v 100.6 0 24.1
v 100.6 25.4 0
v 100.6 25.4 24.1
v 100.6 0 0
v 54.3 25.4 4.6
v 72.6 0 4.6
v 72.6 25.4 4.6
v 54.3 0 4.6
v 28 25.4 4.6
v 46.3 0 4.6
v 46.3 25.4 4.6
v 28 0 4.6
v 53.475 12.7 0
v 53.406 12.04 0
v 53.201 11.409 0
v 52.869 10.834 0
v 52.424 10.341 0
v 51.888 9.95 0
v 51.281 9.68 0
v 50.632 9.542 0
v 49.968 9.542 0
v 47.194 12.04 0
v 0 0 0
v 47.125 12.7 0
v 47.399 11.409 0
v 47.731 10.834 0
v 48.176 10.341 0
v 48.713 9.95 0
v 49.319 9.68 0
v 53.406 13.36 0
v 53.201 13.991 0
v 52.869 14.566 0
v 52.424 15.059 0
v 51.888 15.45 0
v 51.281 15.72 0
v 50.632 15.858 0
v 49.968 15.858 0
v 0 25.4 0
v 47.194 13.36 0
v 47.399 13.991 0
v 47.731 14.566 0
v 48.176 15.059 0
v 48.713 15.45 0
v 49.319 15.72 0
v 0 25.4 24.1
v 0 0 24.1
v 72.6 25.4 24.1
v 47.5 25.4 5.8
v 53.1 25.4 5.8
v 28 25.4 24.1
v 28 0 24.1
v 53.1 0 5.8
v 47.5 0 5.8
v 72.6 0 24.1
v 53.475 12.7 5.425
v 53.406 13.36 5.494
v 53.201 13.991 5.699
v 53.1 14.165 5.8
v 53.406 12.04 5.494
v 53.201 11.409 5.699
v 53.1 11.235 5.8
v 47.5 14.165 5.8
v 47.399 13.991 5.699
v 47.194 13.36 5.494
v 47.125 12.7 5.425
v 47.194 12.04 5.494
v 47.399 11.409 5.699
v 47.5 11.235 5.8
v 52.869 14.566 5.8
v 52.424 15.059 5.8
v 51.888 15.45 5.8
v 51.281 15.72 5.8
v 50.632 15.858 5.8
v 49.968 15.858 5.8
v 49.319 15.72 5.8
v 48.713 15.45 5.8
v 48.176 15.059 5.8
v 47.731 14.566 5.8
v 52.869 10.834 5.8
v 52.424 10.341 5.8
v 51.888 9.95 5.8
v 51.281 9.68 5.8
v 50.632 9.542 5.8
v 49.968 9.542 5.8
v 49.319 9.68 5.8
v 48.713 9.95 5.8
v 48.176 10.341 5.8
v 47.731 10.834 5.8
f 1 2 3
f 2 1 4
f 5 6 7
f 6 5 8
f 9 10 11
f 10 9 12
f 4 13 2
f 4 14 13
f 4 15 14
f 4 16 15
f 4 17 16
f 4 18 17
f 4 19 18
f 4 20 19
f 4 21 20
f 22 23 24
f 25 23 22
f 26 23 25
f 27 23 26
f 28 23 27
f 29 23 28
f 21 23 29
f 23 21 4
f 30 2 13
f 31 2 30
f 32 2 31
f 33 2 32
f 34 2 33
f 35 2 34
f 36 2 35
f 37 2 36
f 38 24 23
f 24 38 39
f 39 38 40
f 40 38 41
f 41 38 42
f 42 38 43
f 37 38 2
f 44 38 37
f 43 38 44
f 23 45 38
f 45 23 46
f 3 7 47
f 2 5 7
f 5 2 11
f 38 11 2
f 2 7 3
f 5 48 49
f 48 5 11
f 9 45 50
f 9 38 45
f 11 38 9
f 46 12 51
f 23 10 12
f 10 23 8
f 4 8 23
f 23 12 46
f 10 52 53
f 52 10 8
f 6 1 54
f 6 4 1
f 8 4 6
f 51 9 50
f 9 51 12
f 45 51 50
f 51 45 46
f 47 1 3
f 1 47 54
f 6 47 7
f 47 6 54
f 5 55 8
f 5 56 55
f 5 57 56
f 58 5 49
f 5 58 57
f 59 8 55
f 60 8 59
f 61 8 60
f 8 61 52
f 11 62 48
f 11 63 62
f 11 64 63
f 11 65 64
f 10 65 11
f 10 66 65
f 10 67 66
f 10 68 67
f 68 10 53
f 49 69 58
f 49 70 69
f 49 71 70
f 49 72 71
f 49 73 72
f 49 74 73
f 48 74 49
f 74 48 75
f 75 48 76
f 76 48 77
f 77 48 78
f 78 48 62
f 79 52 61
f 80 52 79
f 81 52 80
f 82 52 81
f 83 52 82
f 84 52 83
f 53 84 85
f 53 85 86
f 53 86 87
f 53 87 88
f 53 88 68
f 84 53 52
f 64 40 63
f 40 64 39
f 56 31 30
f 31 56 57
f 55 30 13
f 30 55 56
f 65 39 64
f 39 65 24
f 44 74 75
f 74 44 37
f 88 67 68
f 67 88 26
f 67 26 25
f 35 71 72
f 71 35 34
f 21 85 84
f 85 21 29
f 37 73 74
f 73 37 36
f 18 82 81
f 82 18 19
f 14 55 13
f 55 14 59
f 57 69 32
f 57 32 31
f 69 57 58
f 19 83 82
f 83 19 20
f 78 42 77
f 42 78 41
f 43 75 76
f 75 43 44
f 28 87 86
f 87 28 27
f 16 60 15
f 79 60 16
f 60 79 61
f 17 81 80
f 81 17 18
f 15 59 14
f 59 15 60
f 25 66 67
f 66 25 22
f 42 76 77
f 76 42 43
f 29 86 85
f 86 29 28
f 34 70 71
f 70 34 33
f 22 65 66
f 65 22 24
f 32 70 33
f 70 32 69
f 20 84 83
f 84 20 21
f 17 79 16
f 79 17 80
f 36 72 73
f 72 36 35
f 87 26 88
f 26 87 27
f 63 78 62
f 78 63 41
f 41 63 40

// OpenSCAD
// End stop for Woodpeckers Story Stick

i2mm = 25.4; // inch to mm conversion
block_x = 28.0;
block_y = 1.0 * i2mm;
block_z = 19.5;

gap_x = 44.6;

wedge_x = 8;
wedge_z = 1.2;
wedge_y = block_y;

plate_x = 2 * block_x + gap_x;
plate_y = block_y;
plate_z = 4.6;

center_x = plate_x/2.0;
center_y = plate_y/2.0;

hole_dia = 1/4.0 * i2mm;
$fs = 0.1;

// The rectangular prism block on each end
module stop_block() {
    cube([block_x, block_y, block_z]);
}

// The flat plate on top
module top_plate() {
    cube([plate_x, plate_y, plate_z]);
}


module wedge_trapezoid_2D() {
    top_x = wedge_x - 2.0 * wedge_z; // 45 degree angle
    dx = wedge_z;
    polygon([[0.0, 0.0],
            [dx, wedge_z], [dx + top_x, wedge_z],
            [wedge_x, 0.0]]);
}

// The trapezoid tab in the center, below the top plate
module wedge() {
    translate([0, wedge_y, 0])
        rotate([90, 0, 0])
            linear_extrude(height = wedge_y)
                wedge_trapezoid_2D();
}

module stop() {
    top_plate();
    translate([0, 0, plate_z]) stop_block();
    translate([block_x + gap_x, 0, plate_z]) stop_block();
    translate([center_x - wedge_x/2.0, 0, plate_z])
        wedge();
}

module hole() {
    cylinder(h = plate_z + wedge_z, d = hole_dia);
}
module stop_with_hole() {
    difference() {
        stop();
        translate([center_x, center_y, 0])
            hole();
    }
}


stop_with_hole();
